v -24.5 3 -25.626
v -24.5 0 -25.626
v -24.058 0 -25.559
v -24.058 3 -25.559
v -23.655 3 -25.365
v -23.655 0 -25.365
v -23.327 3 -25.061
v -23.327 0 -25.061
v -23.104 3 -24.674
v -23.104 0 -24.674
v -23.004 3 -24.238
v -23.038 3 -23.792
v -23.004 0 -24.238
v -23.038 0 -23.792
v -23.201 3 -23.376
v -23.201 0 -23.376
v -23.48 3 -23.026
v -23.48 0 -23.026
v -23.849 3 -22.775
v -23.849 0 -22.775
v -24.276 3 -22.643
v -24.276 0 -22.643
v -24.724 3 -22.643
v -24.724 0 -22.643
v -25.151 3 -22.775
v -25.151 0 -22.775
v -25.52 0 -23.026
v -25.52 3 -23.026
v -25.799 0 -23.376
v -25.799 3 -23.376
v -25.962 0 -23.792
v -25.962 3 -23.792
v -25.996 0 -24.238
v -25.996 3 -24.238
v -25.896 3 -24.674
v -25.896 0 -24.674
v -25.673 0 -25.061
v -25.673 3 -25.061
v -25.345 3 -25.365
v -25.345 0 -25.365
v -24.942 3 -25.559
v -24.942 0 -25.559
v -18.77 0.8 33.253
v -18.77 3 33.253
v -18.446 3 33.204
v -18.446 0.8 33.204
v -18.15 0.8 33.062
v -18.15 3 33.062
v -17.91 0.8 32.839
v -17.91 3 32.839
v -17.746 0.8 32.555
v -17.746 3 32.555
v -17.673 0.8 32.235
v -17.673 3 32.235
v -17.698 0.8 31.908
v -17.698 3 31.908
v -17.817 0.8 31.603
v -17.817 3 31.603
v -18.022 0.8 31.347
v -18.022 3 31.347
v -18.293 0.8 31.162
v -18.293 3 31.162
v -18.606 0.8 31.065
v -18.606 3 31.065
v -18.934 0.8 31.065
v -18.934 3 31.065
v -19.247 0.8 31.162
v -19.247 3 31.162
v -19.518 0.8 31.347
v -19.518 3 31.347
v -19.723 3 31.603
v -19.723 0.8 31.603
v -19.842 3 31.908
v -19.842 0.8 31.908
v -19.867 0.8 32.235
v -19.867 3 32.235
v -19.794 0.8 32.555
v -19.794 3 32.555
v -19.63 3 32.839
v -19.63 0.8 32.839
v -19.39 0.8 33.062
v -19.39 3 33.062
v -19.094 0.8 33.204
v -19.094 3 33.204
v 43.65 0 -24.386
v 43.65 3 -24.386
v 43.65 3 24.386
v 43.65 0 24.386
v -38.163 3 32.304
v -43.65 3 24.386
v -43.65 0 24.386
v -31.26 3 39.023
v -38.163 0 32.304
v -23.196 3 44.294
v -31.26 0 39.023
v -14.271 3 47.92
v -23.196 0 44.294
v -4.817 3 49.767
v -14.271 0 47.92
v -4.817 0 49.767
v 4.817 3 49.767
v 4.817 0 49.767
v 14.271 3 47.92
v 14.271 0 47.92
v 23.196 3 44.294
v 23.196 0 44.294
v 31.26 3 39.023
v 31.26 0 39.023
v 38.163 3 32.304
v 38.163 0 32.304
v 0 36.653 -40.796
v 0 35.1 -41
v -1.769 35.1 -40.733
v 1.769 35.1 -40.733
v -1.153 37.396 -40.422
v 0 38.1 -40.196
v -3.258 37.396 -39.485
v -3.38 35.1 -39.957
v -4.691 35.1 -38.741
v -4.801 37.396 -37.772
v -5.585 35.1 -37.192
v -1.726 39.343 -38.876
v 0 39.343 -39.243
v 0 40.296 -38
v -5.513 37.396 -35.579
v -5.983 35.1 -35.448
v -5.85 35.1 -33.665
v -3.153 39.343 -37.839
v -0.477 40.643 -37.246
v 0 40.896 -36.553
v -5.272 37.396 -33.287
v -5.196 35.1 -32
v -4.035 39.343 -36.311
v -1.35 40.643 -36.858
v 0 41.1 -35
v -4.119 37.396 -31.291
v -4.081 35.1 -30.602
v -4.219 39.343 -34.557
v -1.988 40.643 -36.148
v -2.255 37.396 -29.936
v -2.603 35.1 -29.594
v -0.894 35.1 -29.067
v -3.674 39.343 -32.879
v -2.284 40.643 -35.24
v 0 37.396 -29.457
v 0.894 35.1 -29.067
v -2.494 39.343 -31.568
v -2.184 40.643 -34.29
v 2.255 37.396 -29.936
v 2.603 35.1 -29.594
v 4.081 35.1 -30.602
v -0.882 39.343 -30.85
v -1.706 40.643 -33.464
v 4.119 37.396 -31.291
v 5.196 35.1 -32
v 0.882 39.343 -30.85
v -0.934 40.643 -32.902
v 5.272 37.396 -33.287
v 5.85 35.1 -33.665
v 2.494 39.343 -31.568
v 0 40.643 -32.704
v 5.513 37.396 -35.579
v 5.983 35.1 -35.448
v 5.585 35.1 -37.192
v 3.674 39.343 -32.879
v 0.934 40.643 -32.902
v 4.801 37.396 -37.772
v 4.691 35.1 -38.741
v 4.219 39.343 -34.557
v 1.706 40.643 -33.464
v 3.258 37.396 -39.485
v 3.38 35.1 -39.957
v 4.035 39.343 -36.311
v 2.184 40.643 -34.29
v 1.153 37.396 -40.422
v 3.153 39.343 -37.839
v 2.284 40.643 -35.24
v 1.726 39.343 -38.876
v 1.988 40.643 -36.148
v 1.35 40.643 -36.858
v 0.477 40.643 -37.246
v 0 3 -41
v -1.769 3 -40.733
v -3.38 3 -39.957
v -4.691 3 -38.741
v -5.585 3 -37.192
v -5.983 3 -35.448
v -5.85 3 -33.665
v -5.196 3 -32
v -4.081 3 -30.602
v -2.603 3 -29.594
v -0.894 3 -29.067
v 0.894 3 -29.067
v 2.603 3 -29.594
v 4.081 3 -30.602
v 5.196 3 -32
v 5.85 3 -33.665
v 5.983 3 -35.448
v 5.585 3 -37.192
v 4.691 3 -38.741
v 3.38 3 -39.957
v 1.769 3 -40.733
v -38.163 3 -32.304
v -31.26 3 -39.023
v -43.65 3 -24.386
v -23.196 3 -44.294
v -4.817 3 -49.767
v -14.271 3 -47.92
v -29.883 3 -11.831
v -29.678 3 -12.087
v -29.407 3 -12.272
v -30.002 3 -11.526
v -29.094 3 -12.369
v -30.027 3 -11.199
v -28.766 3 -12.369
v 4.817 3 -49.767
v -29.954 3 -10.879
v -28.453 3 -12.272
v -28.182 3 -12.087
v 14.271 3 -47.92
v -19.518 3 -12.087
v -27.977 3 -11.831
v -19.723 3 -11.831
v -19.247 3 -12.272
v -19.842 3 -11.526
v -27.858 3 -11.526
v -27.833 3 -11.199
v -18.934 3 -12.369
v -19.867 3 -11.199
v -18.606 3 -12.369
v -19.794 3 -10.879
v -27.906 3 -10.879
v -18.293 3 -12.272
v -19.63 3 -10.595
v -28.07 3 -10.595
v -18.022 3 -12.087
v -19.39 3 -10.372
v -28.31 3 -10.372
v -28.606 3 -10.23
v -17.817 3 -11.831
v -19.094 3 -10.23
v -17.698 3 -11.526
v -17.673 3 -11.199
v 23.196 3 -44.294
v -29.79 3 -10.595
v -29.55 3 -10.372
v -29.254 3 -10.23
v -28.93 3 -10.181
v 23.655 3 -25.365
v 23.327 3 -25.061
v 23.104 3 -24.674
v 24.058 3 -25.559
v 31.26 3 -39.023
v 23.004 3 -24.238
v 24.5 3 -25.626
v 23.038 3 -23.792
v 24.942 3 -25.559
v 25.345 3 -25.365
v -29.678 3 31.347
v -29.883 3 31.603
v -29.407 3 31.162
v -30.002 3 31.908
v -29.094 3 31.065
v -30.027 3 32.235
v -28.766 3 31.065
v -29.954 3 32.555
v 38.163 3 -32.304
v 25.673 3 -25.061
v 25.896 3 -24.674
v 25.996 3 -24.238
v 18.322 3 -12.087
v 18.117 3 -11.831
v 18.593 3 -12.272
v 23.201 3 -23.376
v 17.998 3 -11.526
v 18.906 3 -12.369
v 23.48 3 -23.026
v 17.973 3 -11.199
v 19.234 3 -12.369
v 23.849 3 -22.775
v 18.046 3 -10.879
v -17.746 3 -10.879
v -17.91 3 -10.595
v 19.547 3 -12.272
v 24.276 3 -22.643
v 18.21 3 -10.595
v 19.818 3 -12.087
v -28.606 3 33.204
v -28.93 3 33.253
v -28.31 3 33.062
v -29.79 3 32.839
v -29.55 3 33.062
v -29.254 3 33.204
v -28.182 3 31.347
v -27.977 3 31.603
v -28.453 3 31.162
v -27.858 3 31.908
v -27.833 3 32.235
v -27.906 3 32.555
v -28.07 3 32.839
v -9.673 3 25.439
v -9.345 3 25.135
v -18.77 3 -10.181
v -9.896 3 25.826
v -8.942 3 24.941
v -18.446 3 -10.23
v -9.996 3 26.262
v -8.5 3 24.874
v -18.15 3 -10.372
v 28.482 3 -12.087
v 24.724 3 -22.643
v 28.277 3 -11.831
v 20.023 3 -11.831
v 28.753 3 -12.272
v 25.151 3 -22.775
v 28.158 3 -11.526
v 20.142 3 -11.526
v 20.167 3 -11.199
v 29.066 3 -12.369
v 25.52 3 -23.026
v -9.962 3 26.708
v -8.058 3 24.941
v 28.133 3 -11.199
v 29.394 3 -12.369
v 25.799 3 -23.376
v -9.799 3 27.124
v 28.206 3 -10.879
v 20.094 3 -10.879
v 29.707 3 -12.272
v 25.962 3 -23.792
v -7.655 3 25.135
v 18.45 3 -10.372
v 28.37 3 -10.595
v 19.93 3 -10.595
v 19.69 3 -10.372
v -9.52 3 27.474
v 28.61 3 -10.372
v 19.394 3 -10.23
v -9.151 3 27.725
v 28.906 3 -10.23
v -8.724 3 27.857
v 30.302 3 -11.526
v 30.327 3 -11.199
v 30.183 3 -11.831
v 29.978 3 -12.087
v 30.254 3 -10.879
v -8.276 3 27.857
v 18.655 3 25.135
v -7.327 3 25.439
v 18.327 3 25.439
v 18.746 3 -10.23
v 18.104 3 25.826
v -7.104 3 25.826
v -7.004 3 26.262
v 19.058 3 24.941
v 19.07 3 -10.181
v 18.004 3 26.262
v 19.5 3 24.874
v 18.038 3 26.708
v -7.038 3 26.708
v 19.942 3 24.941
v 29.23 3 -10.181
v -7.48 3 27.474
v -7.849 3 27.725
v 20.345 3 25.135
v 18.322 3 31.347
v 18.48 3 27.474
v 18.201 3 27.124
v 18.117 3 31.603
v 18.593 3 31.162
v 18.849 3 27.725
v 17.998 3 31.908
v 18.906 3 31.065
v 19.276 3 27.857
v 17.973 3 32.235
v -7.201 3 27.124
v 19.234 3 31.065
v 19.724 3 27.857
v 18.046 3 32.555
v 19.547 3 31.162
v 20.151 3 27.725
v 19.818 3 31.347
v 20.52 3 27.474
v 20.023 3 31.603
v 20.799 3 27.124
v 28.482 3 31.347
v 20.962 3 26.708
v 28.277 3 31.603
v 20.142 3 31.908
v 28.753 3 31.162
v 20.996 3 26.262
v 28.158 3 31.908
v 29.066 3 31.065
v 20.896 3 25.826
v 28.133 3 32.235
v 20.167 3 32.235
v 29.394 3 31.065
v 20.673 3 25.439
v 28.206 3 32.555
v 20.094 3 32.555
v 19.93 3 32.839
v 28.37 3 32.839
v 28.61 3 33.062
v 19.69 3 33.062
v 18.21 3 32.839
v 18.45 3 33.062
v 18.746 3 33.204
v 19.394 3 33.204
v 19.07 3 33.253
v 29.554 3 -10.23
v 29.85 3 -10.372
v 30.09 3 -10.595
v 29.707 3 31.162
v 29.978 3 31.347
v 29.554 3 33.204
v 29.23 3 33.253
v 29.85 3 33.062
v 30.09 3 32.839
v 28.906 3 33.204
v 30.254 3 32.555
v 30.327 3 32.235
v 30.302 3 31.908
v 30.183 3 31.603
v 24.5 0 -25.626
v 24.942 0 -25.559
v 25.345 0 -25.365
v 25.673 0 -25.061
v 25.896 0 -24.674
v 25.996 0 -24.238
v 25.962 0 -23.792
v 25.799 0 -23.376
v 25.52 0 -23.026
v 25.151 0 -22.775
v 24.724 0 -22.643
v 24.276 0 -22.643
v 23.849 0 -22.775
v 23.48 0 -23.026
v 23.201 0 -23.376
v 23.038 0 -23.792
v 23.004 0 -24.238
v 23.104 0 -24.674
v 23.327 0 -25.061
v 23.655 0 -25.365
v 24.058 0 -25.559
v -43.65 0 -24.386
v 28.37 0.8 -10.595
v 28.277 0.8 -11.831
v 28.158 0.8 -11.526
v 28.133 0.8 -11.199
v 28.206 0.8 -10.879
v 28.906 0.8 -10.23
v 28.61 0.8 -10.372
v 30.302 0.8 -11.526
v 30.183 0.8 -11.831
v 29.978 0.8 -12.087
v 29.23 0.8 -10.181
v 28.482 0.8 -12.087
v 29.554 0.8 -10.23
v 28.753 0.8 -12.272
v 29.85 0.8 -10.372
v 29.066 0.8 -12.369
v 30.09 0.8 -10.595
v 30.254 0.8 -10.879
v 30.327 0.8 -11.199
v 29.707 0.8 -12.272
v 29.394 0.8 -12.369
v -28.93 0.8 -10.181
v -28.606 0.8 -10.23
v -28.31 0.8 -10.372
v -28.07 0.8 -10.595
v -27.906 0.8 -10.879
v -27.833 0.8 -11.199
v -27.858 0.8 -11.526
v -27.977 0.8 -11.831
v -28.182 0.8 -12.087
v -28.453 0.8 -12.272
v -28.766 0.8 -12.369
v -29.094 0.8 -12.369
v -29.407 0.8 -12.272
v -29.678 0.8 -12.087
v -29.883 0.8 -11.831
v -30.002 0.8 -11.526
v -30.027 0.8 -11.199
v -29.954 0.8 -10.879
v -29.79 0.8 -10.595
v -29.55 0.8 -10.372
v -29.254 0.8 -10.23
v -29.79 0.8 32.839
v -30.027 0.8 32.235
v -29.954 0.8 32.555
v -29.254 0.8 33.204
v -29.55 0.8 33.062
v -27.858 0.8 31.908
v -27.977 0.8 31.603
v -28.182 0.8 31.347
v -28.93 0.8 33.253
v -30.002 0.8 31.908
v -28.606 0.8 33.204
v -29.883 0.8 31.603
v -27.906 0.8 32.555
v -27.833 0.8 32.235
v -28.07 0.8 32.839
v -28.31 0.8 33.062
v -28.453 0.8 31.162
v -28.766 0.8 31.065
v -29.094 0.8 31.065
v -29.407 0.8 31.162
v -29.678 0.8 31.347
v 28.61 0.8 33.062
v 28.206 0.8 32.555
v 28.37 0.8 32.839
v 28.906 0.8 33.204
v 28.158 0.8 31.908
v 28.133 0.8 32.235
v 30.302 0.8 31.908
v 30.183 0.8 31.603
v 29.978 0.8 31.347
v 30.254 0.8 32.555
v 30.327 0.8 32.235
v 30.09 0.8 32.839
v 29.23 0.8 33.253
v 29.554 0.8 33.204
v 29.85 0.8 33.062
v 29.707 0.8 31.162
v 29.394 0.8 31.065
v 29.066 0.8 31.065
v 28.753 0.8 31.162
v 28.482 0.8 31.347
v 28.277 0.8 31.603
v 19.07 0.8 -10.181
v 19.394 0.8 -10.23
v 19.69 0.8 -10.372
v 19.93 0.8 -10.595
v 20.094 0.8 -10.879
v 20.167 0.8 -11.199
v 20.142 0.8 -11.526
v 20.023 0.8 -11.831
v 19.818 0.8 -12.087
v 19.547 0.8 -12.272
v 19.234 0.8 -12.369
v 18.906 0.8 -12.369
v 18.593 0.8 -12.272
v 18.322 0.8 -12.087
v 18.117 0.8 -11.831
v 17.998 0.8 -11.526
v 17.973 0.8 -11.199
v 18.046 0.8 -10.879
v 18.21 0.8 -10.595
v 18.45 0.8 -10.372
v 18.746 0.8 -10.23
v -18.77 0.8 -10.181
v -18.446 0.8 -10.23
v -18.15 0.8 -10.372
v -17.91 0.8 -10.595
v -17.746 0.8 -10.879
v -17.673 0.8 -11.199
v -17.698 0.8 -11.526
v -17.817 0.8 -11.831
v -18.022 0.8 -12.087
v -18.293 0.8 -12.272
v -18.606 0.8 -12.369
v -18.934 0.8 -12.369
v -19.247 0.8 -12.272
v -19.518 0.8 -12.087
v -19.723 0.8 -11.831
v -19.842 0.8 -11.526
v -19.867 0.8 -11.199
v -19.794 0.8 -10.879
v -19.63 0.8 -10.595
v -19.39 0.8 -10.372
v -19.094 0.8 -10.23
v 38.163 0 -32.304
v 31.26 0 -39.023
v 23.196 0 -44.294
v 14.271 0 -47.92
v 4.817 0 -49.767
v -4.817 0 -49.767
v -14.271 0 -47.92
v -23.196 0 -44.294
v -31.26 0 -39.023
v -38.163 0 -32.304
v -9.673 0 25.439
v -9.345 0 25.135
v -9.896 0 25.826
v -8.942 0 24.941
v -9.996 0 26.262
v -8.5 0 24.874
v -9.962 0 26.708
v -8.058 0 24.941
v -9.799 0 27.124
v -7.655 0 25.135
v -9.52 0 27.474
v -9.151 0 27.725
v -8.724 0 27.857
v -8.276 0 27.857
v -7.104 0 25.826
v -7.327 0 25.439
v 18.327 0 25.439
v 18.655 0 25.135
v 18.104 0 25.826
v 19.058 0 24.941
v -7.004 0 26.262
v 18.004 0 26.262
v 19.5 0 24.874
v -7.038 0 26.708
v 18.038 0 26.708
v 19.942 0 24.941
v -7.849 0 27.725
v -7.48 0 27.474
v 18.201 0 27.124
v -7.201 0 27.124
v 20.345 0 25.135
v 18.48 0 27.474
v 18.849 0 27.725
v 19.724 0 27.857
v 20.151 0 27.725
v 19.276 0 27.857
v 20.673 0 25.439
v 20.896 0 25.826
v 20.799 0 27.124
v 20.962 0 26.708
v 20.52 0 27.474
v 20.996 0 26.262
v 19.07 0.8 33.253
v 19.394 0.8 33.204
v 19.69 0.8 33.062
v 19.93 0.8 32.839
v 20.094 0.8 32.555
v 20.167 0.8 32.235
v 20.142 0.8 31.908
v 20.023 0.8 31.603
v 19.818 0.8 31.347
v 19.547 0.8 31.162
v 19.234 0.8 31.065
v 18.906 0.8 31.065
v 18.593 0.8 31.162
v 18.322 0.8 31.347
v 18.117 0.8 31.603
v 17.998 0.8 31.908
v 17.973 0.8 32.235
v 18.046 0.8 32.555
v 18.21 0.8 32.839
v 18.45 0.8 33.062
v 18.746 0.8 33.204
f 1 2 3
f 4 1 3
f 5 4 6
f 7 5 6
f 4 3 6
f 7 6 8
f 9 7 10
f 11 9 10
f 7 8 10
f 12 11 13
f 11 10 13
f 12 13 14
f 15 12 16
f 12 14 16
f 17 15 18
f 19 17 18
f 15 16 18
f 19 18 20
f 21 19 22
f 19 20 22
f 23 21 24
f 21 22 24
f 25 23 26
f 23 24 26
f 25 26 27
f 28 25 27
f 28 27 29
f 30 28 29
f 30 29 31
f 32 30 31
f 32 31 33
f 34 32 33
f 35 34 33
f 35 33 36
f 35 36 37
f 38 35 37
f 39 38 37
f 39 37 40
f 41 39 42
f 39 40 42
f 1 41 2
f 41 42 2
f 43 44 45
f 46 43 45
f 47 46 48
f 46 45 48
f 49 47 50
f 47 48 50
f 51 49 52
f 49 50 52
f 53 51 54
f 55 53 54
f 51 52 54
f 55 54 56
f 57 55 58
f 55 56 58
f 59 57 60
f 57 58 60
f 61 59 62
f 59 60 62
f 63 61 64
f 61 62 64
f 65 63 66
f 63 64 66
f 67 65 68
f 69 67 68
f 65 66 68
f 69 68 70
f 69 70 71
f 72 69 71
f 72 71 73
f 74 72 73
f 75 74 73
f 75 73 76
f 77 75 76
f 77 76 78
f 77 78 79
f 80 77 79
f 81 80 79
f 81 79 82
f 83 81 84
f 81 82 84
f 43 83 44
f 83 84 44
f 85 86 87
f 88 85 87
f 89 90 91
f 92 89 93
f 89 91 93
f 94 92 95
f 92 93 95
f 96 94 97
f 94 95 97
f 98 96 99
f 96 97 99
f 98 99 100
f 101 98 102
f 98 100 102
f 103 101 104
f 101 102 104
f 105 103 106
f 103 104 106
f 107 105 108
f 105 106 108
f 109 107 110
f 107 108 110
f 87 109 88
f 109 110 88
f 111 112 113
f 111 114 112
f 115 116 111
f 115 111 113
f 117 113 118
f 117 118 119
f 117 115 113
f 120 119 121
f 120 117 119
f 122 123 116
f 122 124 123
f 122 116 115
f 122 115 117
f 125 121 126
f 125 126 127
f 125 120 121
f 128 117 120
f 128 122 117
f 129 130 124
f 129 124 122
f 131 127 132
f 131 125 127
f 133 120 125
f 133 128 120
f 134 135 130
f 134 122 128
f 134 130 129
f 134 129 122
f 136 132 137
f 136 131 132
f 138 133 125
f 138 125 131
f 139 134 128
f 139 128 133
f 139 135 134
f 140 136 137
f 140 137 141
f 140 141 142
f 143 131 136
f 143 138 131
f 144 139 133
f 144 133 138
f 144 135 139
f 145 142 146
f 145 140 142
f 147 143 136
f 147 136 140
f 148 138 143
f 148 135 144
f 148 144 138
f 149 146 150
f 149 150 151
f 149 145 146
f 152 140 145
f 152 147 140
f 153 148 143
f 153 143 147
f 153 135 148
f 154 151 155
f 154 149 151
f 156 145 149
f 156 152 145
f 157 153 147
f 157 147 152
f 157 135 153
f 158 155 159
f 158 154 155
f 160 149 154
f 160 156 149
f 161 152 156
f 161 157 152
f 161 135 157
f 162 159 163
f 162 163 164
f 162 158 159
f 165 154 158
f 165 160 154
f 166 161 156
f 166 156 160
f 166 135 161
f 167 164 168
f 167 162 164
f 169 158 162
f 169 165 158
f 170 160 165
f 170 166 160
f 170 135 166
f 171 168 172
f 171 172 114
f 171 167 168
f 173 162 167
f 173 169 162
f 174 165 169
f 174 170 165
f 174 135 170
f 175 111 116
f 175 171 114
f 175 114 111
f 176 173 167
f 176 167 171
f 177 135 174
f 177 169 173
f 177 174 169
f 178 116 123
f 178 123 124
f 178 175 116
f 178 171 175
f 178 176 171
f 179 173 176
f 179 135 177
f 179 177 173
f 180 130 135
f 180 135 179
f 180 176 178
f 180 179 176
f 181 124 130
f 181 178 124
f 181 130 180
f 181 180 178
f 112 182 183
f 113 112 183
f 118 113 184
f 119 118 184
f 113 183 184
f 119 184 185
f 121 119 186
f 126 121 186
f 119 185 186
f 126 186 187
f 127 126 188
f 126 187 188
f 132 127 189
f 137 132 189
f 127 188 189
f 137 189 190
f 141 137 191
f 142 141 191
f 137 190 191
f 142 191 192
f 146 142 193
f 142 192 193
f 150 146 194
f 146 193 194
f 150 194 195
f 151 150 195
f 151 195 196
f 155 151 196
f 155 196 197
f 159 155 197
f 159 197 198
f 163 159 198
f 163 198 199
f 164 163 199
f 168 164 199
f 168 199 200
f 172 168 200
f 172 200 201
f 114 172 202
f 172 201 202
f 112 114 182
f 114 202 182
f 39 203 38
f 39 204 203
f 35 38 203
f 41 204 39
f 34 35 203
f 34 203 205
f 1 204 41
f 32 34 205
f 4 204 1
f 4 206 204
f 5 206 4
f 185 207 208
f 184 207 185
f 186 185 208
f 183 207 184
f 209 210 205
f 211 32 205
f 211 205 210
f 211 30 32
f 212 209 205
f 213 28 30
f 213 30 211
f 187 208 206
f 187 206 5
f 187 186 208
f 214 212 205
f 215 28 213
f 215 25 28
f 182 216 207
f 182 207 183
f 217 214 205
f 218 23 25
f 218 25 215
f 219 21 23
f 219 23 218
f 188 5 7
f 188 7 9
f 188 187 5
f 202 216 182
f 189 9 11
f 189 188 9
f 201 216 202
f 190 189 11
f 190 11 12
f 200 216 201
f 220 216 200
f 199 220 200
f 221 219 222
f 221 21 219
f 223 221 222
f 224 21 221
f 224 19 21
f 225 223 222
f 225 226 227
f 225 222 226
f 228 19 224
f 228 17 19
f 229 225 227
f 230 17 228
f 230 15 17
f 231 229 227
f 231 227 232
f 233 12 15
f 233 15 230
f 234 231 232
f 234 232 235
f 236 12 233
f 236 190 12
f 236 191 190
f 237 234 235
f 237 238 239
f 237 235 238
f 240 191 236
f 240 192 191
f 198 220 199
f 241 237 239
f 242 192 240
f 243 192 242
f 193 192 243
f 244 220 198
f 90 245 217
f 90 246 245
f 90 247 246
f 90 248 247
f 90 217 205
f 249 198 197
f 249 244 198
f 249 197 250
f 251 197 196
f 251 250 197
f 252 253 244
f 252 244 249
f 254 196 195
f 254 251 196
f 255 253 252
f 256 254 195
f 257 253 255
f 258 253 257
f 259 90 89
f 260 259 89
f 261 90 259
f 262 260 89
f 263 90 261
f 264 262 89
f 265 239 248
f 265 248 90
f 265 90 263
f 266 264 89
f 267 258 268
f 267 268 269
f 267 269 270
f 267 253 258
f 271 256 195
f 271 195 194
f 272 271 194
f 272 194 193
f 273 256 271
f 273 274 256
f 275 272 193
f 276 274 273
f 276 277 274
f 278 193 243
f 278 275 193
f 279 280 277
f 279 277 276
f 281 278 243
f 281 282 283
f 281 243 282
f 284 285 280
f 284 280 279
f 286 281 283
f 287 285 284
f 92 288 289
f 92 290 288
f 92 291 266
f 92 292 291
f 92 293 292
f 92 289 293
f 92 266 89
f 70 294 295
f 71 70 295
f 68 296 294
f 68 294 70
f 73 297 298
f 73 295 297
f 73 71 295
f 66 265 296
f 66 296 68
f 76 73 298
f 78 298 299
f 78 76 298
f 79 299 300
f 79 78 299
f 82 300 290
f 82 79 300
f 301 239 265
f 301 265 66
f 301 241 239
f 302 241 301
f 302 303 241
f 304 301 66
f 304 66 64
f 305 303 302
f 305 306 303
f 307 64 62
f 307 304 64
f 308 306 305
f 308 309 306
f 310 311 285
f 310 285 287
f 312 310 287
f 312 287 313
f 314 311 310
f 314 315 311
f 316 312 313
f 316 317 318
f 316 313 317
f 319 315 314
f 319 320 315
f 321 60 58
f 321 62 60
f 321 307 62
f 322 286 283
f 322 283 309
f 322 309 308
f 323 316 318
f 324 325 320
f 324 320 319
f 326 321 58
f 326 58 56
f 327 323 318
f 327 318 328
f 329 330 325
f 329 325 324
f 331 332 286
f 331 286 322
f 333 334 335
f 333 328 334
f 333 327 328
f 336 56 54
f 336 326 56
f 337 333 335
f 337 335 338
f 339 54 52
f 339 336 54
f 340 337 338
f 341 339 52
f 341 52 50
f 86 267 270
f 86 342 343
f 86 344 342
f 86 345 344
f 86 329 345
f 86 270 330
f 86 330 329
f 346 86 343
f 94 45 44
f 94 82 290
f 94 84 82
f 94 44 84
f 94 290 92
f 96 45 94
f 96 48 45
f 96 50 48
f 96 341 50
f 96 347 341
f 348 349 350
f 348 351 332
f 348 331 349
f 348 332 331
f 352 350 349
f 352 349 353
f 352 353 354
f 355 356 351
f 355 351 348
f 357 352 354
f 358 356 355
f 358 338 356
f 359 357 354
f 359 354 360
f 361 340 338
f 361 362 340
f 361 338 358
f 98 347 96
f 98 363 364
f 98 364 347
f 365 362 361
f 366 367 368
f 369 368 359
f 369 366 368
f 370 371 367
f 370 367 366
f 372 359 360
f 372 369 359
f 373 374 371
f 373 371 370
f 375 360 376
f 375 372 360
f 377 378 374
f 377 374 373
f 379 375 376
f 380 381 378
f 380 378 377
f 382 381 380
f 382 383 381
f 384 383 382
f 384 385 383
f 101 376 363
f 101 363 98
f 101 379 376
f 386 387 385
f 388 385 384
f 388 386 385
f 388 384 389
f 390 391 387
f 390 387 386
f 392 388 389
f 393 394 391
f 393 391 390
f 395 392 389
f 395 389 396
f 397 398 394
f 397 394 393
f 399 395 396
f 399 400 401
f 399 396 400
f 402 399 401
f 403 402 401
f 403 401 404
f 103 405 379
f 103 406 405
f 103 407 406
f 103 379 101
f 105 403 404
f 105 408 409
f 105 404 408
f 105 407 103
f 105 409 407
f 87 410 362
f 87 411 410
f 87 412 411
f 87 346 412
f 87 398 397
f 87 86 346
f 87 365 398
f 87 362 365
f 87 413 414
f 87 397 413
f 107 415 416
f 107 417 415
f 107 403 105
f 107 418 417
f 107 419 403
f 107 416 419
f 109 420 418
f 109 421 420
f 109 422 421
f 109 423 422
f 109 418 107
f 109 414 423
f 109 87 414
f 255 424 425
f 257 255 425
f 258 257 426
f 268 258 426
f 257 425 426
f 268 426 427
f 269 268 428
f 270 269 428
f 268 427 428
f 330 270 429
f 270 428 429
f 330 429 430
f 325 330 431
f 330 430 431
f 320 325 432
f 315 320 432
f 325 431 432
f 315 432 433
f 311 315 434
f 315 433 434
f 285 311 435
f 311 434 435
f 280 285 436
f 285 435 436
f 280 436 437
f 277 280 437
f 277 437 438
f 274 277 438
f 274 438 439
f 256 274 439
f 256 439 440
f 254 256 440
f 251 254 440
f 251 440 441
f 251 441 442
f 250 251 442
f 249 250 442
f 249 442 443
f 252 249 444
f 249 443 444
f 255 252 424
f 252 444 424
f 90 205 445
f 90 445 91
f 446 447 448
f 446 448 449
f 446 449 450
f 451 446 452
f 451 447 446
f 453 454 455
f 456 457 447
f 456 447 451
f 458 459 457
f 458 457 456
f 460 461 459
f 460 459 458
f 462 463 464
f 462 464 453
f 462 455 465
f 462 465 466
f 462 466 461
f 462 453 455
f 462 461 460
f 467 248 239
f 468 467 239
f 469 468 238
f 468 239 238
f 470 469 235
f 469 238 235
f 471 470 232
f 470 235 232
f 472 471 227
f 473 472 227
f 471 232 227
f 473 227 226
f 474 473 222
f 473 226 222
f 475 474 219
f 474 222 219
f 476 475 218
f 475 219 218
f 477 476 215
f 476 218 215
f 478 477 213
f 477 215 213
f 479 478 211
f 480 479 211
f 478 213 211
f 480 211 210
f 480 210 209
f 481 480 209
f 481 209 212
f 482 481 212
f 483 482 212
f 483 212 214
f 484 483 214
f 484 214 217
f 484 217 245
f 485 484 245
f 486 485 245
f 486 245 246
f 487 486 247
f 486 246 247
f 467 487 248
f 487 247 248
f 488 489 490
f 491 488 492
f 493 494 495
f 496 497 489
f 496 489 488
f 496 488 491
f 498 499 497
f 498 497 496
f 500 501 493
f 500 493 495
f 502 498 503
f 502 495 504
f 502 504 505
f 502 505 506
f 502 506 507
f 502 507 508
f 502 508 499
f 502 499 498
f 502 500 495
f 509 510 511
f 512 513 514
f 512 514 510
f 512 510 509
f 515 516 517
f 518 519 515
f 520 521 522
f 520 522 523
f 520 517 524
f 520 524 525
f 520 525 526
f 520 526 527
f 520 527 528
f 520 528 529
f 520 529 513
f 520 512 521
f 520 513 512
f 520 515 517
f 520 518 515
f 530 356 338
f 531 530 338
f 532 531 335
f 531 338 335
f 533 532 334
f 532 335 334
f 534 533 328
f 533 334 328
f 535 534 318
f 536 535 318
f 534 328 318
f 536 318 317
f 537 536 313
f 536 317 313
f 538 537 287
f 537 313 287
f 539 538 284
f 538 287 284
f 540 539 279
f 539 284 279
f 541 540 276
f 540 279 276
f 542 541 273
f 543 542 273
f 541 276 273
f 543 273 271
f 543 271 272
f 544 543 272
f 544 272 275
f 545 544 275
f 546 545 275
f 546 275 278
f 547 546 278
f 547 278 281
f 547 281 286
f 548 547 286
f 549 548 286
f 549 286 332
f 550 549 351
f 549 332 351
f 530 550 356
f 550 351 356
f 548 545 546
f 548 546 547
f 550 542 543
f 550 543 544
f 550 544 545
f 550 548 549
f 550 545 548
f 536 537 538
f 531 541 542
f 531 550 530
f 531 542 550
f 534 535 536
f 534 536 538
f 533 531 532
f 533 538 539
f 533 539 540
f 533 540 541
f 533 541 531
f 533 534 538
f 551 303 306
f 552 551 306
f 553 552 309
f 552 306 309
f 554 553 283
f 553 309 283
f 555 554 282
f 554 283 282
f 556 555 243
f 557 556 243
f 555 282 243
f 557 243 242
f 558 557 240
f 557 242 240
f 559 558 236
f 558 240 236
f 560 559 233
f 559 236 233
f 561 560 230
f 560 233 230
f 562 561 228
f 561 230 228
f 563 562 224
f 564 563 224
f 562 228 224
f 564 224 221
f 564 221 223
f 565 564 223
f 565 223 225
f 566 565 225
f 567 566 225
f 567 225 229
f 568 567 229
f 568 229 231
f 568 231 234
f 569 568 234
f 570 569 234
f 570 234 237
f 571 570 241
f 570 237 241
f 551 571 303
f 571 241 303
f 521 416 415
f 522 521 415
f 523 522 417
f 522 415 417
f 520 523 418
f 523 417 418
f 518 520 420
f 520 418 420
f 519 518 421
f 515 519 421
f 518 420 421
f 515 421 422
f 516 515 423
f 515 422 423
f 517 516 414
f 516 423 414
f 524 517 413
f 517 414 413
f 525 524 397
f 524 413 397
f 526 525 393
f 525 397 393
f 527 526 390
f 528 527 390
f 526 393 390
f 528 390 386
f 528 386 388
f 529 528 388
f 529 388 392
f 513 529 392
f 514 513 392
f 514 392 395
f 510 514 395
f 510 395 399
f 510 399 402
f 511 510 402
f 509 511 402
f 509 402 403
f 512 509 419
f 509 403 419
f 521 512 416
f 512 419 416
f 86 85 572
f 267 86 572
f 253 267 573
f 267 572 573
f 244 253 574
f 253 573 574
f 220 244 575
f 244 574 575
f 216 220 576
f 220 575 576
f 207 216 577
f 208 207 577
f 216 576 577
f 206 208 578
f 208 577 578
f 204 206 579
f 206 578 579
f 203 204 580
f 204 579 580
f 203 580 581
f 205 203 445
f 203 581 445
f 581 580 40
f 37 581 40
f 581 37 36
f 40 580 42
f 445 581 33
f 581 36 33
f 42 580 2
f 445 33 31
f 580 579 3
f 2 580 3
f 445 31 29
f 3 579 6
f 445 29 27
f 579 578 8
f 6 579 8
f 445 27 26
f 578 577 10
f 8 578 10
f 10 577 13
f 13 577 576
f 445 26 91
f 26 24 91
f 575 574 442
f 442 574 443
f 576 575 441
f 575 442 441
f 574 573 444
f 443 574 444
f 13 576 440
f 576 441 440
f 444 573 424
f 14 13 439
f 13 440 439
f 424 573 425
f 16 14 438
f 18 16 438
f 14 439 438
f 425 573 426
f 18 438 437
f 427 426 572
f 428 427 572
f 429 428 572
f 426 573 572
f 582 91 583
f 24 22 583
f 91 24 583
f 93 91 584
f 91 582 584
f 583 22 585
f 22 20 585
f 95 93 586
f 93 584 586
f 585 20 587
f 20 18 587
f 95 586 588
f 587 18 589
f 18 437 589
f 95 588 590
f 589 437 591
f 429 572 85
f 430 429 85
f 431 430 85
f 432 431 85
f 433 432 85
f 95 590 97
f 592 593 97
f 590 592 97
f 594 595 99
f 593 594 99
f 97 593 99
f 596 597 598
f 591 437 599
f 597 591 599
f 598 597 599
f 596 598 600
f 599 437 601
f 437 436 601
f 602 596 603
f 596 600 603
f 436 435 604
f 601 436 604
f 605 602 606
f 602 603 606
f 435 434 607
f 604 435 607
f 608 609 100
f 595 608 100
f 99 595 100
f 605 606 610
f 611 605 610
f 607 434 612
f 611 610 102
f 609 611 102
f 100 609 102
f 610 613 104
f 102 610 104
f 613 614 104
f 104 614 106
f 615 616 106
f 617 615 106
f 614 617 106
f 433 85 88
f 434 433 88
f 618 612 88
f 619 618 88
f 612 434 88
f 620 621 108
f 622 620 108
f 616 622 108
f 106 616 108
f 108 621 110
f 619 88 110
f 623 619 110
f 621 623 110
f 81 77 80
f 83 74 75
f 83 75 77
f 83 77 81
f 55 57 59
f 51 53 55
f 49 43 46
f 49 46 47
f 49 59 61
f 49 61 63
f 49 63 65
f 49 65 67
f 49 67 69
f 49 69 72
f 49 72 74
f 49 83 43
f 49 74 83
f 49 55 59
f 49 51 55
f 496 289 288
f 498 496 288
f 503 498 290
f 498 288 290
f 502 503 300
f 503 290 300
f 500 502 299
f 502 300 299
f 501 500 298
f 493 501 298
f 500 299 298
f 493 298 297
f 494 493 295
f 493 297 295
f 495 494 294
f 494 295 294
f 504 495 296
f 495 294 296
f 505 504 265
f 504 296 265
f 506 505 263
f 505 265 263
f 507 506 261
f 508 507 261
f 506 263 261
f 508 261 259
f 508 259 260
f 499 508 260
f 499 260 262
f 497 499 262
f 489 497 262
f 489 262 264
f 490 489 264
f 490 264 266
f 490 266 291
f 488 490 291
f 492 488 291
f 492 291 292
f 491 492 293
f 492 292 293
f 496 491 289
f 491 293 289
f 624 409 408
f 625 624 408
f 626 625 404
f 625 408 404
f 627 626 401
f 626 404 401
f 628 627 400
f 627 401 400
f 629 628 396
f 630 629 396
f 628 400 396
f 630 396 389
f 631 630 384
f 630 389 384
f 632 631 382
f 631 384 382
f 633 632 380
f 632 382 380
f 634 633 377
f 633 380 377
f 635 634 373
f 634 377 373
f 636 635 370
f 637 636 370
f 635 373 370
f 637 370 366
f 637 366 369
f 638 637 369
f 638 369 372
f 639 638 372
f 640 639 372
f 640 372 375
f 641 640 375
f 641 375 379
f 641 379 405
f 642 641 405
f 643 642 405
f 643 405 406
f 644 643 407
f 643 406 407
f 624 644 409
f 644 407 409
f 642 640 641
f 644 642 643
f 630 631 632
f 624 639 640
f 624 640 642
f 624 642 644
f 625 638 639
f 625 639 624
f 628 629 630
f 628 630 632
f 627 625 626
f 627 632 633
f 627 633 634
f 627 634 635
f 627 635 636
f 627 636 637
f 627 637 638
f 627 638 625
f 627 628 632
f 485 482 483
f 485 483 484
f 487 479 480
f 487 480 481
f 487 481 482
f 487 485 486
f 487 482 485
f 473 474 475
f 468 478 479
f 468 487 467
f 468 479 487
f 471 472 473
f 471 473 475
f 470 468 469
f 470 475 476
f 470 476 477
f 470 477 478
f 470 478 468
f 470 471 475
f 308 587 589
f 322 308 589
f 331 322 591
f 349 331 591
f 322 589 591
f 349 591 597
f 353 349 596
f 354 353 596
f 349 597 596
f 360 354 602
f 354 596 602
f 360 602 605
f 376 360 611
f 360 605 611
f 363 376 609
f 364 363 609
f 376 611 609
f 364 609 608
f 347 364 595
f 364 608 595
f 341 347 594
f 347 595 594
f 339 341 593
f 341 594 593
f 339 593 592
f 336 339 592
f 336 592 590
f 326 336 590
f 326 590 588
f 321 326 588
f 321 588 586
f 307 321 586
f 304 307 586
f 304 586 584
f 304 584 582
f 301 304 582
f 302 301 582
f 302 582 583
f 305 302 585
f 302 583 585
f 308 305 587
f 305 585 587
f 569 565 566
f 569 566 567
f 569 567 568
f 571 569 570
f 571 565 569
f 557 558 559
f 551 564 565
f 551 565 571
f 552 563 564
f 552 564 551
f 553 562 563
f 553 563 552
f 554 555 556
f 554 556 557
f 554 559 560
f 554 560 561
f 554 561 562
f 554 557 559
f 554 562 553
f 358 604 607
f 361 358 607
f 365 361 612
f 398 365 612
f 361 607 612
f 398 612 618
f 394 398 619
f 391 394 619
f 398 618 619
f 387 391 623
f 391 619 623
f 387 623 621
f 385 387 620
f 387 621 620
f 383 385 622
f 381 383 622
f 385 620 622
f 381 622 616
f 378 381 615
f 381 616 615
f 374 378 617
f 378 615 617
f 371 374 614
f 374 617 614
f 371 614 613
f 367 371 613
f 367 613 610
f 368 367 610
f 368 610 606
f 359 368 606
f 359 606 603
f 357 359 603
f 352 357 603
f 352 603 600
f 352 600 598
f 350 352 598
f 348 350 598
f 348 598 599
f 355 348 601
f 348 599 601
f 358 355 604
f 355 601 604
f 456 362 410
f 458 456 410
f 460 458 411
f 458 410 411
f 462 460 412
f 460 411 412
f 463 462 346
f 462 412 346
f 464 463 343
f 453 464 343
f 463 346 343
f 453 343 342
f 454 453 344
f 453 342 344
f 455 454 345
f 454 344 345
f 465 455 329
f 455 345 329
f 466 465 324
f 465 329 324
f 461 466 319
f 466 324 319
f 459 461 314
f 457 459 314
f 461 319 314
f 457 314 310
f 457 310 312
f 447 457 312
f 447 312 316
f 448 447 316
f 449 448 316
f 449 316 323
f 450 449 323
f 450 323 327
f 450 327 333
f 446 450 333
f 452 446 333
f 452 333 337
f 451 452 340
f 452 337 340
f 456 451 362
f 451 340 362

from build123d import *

# Parameters (mm, degrees)
SKETCH2_R           = 50
BOSS_EXTRUDE1_DEPTH = 3
SKETCH3_R           = 6
BOSS_EXTRUDE2_DEPTH = 38.1
FILLET1_R           = 6
CUT_EXTRUDE1_DEPTH  = 38.1
SKETCH7_R           = 1.1
CUT_EXTRUDE2_DEPTH  = 2.2
SKETCH8_R           = 1.5
CUT_EXTRUDE3_DEPTH  = 3


with BuildPart() as part:
    # Sketch2 → Boss-Extrude1 (new body)
    with BuildSketch(Plane(origin=(0, 0, 0), x_dir=(1, 0, 0), z_dir=(0, 1, 0))):
        with Locations(Location((0, 0, 0), (0, 0, 270))):
            Circle(SKETCH2_R)
    extrude(amount=BOSS_EXTRUDE1_DEPTH)

    # Sketch3 → Boss-Extrude2 (add)
    with BuildSketch(Plane(origin=(0, 3, 0), x_dir=(1, 0, 0), z_dir=(0, 1, 0))):
        with Locations(Location((0, 35, 0), (0, 0, 90))):
            Circle(SKETCH3_R)
    extrude(amount=BOSS_EXTRUDE2_DEPTH)

    # Fillet1
    fillet1_edges = [part.edges().sort_by_distance(p)[0] for p in [
        (0, 41.1, -29),
    ]]
    fillet(fillet1_edges, radius=FILLET1_R)

    # Sketch6 → Cut-Extrude1 (cut)
    with BuildSketch(Plane(origin=(0, 3, 0), x_dir=(1, 0, 0), z_dir=(0, 1, 0))):
        Polygon((-43.65, 24.386010334), (-43.65, -24.386010334), (-50, -24.386010334), (-50, 0), (-50, 24.386010334), align=None)
        Polygon((43.65, 24.386010334), (43.65, -24.386010334), (50, -24.386010334), (50, 0), (50, 24.386010334), align=None)
    extrude(amount=-CUT_EXTRUDE1_DEPTH, mode=Mode.SUBTRACT)

    # Sketch7 → Cut-Extrude2 (cut)
    with BuildSketch(Plane(origin=(0, 3, 0), x_dir=(1, 0, 0), z_dir=(0, 1, 0))):
        with Locations(Location((-28.93, 11.280989666, 0), (0, 0, 270))):
            Circle(SKETCH7_R)
        with Locations(Location((-18.77, 11.280989666, 0), (0, 0, 270))):
            Circle(SKETCH7_R)
        with Locations(Location((19.07, 11.280989666, 0), (0, 0, 270))):
            Circle(SKETCH7_R)
        with Locations(Location((29.23, 11.280989666, 0), (0, 0, 270))):
            Circle(SKETCH7_R)
        with Locations(Location((29.23, -32.153010334, 0), (0, 0, 270))):
            Circle(SKETCH7_R)
        with Locations(Location((19.07, -32.153010334, 0), (0, 0, 270))):
            Circle(SKETCH7_R)
        with Locations(Location((-18.77, -32.153010334, 0), (0, 0, 270))):
            Circle(SKETCH7_R)
        with Locations(Location((-28.93, -32.153010334, 0), (0, 0, 270))):
            Circle(SKETCH7_R)
    extrude(amount=-CUT_EXTRUDE2_DEPTH, mode=Mode.SUBTRACT)

    # Sketch8 → Cut-Extrude3 (cut)
    with BuildSketch(Plane(origin=(0, 0, 0), x_dir=(-1, 0, 0), z_dir=(0, -1, 0))):
        with Locations(Location((-19.5, -26.373989666, 0), (0, 0, 90))):
            Circle(SKETCH8_R)
        with Locations(Location((8.5, -26.373989666, 0), (0, 0, 90))):
            Circle(SKETCH8_R)
        with Locations(Location((-24.5, 24.126010334, 0), (0, 0, 90))):
            Circle(SKETCH8_R)
        with Locations(Location((24.5, 24.126010334, 0), (0, 0, 90))):
            Circle(SKETCH8_R)
    extrude(amount=-CUT_EXTRUDE3_DEPTH, mode=Mode.SUBTRACT)


solid = part.part
